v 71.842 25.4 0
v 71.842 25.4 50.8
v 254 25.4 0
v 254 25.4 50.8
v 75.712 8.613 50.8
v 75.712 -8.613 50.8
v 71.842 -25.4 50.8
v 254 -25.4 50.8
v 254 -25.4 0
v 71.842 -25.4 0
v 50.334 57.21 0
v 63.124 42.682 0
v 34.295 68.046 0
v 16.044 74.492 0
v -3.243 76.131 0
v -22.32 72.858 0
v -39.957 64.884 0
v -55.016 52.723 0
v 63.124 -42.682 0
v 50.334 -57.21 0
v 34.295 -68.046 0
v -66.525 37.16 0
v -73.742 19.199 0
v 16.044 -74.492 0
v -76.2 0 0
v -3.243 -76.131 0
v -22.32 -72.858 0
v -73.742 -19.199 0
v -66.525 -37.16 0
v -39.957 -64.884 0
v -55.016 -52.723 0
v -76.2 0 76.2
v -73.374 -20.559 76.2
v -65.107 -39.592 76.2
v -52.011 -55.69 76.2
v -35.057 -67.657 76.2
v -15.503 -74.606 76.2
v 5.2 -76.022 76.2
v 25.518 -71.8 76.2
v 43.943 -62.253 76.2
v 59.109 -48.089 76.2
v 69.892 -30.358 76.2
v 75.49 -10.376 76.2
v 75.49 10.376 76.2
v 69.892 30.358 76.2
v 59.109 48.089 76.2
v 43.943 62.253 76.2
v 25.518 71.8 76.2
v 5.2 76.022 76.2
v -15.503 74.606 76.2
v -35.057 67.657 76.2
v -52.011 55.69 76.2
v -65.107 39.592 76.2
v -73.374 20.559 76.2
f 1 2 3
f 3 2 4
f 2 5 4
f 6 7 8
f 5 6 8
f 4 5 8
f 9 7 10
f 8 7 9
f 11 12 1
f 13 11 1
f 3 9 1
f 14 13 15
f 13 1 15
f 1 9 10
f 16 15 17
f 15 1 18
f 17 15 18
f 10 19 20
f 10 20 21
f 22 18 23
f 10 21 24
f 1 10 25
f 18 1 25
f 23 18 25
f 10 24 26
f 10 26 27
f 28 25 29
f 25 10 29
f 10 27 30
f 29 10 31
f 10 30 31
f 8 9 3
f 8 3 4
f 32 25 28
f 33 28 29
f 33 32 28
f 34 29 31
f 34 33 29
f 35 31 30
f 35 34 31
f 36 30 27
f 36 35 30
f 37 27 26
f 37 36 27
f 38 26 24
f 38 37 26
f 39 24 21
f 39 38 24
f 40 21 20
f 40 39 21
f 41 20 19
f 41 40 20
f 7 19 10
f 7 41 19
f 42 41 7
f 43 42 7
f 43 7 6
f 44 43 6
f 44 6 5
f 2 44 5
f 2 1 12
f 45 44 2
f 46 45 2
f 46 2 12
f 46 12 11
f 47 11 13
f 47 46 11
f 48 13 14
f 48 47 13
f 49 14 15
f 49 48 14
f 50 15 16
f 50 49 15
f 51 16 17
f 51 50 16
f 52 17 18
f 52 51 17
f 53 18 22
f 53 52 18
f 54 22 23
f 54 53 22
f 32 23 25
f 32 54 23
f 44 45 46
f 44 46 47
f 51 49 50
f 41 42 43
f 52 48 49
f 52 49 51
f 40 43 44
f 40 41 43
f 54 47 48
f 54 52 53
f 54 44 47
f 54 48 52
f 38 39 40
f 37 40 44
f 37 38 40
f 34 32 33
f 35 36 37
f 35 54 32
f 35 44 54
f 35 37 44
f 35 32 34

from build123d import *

# Parameters (mm, degrees)
F0_W     = 254
F0_H     = 50.8
F1_DEPTH = 25.4
F3_W     = 76.2
F3_H     = 76.2


with BuildPart() as f1:
    # F0 (on Front) → F1 (new body, symmetric)
    with BuildSketch(Plane.XZ):
        with Locations((127, 25.4)):
            Rectangle(F0_W, F0_H)
    extrude(amount=F1_DEPTH, both=True)

    # F3 (on Front) → F4 (revolve)
    with BuildSketch(Plane.XZ):
        with Locations((-38.1, 38.1)):
            Rectangle(F3_W, F3_H)
    revolve(axis=Axis((0, 0, 56.434907), (0, 0, 1)))


solid = f1.part
